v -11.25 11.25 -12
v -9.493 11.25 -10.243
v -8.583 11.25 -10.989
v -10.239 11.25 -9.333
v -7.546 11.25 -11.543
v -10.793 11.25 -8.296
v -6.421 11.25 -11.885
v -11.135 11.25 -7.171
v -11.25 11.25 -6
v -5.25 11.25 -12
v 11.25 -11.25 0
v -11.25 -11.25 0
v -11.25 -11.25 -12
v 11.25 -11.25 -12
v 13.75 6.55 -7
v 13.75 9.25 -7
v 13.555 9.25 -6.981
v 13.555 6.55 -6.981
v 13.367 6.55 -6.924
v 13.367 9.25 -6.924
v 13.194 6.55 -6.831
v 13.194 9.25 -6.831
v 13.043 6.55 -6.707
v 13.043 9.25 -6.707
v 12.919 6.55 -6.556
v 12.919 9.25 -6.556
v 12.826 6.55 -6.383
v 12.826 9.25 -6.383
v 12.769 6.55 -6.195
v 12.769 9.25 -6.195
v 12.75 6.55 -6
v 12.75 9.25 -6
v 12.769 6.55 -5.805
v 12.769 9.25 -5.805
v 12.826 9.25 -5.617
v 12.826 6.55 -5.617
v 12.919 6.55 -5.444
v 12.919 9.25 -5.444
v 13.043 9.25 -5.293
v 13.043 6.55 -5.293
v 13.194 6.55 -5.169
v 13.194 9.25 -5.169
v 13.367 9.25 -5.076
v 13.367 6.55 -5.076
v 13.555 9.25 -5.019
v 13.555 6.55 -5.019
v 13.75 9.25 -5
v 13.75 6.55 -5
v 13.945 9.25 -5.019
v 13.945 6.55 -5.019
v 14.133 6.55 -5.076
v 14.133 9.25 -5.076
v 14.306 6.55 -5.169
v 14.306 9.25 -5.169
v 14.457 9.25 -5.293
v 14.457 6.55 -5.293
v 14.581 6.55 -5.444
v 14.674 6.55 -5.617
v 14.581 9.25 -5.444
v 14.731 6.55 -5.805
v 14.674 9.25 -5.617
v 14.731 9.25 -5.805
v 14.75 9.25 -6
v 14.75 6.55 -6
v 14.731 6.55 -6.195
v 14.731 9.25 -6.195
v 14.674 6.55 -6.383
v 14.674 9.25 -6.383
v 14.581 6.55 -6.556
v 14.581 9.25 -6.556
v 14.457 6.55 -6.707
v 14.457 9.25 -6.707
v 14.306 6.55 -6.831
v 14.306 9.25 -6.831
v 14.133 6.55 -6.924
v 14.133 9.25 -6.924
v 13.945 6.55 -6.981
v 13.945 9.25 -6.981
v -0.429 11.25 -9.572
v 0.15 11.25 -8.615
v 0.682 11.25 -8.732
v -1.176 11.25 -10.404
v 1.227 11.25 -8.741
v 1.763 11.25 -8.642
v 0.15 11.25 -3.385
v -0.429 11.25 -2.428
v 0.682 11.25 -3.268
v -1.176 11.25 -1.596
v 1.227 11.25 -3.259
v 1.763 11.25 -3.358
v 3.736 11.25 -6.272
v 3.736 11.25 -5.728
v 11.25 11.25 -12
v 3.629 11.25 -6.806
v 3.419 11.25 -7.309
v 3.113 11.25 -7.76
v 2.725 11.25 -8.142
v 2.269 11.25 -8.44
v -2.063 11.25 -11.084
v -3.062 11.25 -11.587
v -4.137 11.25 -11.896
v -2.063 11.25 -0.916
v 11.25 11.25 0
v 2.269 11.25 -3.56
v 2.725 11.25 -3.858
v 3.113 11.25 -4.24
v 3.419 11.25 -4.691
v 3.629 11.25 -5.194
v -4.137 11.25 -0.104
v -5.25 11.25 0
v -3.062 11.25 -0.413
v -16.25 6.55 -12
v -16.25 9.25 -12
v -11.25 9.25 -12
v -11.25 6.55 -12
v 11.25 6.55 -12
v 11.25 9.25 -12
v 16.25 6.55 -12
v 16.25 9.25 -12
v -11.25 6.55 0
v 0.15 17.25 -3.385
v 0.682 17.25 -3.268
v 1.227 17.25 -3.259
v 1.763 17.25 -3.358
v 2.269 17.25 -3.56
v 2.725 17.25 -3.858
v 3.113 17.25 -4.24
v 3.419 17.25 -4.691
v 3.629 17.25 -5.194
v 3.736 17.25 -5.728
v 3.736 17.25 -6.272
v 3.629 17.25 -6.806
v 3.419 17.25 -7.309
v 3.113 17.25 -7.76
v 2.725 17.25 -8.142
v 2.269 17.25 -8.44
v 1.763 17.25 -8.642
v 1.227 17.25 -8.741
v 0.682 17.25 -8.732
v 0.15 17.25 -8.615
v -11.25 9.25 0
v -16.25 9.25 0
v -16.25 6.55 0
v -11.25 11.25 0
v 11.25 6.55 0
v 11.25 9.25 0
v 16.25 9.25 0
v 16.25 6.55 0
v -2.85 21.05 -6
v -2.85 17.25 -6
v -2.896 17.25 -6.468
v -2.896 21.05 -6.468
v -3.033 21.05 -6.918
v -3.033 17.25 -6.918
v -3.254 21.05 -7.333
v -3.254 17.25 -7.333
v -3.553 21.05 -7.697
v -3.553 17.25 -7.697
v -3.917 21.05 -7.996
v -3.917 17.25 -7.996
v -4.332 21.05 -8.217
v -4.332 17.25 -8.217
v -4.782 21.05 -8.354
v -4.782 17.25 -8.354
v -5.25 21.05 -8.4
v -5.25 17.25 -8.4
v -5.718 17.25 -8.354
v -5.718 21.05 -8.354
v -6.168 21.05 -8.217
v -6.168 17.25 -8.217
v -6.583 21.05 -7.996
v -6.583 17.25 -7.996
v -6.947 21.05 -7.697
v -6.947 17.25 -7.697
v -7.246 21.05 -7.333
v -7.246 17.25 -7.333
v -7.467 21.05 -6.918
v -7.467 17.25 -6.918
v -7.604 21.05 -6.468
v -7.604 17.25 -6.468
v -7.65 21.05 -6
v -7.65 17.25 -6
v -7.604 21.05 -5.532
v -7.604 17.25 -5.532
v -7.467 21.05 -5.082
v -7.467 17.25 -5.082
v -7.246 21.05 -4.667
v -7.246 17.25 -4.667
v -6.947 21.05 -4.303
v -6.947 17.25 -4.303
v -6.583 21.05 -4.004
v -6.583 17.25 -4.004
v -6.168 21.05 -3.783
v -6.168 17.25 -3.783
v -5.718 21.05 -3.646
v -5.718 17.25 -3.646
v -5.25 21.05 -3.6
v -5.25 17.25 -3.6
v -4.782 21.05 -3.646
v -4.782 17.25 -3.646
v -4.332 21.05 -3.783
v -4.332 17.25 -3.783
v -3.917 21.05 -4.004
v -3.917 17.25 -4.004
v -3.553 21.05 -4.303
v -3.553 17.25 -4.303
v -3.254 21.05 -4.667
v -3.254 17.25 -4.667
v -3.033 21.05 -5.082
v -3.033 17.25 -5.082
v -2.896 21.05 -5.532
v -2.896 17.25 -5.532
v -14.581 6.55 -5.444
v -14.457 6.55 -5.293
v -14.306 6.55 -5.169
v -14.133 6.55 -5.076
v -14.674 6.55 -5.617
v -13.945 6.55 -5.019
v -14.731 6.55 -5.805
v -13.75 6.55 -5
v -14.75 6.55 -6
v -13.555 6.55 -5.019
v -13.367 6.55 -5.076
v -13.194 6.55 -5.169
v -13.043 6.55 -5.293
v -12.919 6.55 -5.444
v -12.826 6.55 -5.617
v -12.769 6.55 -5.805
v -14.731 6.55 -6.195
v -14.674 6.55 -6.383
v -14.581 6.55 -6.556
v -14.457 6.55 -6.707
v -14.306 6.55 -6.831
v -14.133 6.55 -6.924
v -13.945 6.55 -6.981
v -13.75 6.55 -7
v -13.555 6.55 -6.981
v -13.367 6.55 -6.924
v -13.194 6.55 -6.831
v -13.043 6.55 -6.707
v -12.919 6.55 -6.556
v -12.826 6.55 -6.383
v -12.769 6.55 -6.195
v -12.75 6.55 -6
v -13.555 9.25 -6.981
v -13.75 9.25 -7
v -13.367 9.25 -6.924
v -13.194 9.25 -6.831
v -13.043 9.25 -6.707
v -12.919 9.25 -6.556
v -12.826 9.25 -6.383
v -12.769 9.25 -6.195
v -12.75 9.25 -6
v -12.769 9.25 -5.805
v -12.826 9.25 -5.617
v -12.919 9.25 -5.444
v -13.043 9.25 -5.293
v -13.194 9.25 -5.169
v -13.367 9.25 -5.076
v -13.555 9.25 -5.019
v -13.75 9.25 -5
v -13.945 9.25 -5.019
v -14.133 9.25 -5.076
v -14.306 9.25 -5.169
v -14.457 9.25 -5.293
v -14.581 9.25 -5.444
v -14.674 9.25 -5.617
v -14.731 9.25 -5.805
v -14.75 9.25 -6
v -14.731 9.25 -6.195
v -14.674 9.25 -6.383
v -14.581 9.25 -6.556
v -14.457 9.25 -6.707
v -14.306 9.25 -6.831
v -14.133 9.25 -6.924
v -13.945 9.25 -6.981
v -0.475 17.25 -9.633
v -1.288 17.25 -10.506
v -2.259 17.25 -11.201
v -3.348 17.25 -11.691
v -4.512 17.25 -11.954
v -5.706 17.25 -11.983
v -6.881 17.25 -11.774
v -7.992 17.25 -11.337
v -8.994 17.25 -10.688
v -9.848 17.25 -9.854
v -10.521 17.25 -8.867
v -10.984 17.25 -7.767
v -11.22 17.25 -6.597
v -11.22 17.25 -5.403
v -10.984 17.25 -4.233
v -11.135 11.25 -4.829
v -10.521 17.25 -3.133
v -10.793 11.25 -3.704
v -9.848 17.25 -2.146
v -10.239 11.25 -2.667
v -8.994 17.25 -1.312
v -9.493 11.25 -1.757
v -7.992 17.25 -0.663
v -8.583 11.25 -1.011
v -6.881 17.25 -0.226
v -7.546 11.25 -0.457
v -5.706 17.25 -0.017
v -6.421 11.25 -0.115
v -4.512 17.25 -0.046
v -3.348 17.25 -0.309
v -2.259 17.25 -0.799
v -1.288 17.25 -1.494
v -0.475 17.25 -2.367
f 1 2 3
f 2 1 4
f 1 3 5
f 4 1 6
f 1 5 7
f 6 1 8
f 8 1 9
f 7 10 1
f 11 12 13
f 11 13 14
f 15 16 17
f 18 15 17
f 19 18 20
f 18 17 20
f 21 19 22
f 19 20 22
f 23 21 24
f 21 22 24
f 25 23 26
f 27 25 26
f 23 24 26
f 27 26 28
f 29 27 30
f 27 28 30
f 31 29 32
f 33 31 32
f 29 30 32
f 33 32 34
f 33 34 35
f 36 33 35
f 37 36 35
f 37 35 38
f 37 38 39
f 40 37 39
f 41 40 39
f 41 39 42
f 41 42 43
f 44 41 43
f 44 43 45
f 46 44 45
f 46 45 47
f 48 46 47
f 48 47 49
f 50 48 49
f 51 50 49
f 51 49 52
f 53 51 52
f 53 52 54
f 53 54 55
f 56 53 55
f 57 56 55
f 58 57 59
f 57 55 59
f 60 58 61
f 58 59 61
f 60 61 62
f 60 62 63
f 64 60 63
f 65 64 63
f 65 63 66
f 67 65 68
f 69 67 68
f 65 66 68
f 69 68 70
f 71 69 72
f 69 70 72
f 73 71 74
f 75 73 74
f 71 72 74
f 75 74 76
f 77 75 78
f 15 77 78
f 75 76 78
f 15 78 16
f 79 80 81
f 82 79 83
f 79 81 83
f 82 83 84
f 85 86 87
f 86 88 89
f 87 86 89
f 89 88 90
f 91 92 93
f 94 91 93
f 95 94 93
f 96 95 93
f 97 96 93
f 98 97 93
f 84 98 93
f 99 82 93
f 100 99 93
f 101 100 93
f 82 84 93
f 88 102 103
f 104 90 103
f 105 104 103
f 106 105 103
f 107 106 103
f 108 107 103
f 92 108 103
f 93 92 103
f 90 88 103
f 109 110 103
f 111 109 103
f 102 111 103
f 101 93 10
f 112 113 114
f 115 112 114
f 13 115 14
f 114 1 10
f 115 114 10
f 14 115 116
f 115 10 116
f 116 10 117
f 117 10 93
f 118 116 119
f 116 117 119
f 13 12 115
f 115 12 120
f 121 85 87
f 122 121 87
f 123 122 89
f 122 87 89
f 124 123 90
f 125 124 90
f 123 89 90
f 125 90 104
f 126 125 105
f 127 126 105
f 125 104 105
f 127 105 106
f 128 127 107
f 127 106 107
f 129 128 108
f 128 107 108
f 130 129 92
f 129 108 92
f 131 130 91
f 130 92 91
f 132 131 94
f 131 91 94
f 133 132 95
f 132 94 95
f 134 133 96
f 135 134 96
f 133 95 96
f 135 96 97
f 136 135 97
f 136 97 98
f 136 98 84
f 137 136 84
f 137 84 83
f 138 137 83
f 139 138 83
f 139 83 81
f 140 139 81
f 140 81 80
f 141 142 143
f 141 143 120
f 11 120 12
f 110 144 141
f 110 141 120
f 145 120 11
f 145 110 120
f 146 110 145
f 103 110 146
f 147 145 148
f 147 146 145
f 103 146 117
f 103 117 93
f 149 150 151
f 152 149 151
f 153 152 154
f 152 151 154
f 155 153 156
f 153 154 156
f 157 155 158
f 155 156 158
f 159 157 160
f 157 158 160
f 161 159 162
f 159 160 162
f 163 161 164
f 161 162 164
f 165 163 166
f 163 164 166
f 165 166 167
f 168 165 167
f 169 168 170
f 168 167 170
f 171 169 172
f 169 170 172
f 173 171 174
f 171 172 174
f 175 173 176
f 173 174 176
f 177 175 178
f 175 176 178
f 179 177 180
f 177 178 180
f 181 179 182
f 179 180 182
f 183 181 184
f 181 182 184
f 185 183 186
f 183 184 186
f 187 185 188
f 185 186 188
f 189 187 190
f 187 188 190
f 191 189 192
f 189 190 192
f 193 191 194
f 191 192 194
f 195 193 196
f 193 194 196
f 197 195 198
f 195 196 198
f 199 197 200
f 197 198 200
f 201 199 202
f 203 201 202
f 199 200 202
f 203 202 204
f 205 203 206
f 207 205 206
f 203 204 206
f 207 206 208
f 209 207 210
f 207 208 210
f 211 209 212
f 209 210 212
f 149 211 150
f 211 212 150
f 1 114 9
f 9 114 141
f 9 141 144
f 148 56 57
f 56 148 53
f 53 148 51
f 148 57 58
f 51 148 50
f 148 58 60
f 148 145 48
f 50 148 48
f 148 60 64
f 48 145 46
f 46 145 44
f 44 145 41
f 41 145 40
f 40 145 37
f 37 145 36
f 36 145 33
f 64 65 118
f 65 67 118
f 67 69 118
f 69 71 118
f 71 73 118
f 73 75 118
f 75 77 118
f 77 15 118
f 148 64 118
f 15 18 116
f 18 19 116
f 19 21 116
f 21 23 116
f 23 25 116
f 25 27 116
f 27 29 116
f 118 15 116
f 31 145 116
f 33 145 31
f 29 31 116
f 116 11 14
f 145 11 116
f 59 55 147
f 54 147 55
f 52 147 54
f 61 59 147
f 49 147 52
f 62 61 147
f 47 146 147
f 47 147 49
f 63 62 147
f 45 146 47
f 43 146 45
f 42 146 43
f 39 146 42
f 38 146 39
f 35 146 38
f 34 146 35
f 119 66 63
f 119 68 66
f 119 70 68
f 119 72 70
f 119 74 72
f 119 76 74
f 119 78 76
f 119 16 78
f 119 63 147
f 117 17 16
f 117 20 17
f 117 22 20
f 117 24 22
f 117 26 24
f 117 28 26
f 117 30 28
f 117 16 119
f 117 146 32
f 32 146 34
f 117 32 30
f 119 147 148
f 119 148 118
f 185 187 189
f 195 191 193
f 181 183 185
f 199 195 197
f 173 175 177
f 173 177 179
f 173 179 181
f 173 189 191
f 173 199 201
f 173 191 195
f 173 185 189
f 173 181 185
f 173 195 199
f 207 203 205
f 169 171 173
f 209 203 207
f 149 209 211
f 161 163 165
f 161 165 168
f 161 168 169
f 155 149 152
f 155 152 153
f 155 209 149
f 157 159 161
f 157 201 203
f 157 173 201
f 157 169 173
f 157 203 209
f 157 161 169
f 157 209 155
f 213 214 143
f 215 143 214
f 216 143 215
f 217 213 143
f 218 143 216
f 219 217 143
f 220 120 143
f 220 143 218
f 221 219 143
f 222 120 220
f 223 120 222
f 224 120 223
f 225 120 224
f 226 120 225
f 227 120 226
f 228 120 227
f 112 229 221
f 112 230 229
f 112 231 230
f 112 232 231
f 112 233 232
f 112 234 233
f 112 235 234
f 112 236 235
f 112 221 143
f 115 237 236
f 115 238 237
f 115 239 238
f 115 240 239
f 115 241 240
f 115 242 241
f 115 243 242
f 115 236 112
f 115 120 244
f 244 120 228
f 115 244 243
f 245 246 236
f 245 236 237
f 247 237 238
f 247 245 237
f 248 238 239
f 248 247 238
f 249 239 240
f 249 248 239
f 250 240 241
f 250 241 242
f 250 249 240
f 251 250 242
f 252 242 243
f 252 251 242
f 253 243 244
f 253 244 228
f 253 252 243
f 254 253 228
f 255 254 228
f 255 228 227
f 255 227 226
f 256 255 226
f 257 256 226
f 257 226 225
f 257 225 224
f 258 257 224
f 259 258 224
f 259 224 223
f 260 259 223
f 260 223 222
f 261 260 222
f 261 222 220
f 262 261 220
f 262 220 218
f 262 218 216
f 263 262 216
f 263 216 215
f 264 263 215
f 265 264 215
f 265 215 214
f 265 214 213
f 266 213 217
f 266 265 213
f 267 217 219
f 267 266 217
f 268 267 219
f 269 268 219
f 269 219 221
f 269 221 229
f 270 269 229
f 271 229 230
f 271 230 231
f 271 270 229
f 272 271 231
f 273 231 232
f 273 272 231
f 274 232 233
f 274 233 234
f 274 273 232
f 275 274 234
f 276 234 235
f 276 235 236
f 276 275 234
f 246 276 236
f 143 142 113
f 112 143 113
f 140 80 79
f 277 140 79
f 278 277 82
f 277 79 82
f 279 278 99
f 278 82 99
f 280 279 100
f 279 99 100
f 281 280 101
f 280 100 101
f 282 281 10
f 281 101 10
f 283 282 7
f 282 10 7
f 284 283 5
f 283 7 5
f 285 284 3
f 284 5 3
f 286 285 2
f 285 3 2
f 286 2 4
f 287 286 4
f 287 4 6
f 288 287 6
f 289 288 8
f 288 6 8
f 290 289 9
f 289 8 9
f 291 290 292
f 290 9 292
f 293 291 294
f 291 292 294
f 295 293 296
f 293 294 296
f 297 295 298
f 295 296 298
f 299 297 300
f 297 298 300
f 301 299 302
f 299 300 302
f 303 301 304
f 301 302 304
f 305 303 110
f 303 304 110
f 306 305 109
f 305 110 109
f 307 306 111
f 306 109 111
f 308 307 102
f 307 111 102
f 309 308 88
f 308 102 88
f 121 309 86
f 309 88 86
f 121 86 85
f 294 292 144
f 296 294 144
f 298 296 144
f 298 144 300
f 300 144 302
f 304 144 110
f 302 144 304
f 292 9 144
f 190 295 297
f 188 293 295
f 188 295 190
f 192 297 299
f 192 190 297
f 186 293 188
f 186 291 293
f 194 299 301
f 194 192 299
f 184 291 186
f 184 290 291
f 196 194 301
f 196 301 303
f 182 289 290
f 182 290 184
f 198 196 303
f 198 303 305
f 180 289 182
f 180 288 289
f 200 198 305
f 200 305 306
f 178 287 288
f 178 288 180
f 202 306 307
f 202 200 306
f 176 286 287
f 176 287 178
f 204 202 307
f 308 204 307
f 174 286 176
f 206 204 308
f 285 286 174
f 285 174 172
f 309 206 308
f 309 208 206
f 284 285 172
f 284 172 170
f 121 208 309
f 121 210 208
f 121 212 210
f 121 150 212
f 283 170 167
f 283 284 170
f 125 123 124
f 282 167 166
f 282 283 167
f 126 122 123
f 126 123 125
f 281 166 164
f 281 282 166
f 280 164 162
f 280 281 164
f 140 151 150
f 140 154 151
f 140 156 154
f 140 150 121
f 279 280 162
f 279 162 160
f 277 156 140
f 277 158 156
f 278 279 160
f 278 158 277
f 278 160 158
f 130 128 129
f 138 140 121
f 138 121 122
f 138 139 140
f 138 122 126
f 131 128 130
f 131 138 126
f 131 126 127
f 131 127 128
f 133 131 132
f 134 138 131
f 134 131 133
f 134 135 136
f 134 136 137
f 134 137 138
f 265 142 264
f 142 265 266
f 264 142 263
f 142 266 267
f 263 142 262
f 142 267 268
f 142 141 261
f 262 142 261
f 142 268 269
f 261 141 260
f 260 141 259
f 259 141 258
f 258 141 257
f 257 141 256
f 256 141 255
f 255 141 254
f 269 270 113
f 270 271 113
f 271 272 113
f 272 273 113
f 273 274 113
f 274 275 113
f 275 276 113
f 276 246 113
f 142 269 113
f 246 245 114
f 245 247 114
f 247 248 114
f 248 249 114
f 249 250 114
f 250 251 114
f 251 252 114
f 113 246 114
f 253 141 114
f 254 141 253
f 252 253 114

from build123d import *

# Parameters (mm, degrees)
SKETCH_1_W                      = 22.5
SKETCH_1_H                      = 22.5
EXTRUDE_1_DEPTH                 = 12
SKETCH_2_W                      = 12
SKETCH_2_H                      = 2.7
EXTRUDE_2_DEPTH                 = 5
CUT_EXTRUDE_1_REACH             = 30.78
SKETCH_4_R                      = 1
CUT_EXTRUDE_1_DIRECTION_2_DEPTH = 29.78041869
EXTRUDE_3_DEPTH                 = 6
SKETCH_6_R                      = 2.4
EXTRUDE_4_DEPTH                 = 3.8


with BuildPart() as part:
    # 草图1 → 凸台-拉伸1 (new body)
    with BuildSketch(Plane.XY):
        Rectangle(SKETCH_1_W, SKETCH_1_H)
    extrude(amount=-EXTRUDE_1_DEPTH)

    # 草图2 → 凸台-拉伸2 (add)
    with BuildSketch(Plane(origin=(11.25, 0, 0), x_dir=(0, 0, -1), z_dir=(1, 0, 0))):
        with Locations((6, 7.9)):
            Rectangle(SKETCH_2_W, SKETCH_2_H)
    extrude(amount=EXTRUDE_2_DEPTH)

    # 草图4 → 切除-拉伸1 (cut, up to next)
    with BuildSketch(Plane(origin=(0, 9.25, 0), x_dir=(1, 0, 0), z_dir=(0, 1, 0)), mode=Mode.PRIVATE) as cut_extrude_1_sk1:
        with Locations(Location((13.75, 6, 0), (0, 0, 90))):
            Circle(SKETCH_4_R)
    cut_extrude_1_tool1 = extrude(cut_extrude_1_sk1.sketch, amount=-CUT_EXTRUDE_1_REACH, mode=Mode.PRIVATE) & part.part
    add(cut_extrude_1_tool1.solids().sort_by_distance((13.75, 9.25, -6))[0], mode=Mode.SUBTRACT)

    # 草图4 → 切除-拉伸1 direction 2 (cut)
    with BuildSketch(Plane(origin=(0, 9.25, 0), x_dir=(1, 0, 0), z_dir=(0, 1, 0))):
        with Locations(Location((13.75, 6, 0), (0, 0, 90))):
            Circle(SKETCH_4_R)
    extrude(amount=CUT_EXTRUDE_1_DIRECTION_2_DEPTH, mode=Mode.SUBTRACT)

    # 镜向1: part across plane


with BuildPart() as part_1:
    add(part.part)
    add(part.part.mirror(Plane(origin=(0, 0, 0), x_dir=(0, 0, 1), z_dir=(1, 0, 0))))

    # 草图5 → 凸台-拉伸3 (add)
    with BuildSketch(Plane(origin=(0, 11.25, 0), x_dir=(1, 0, 0), z_dir=(0, 1, 0))):
        with BuildLine():
            ThreePointArc((0.15, 8.615339366), (-11.25, 6), (0.15, 3.384660634))
            ThreePointArc((0.15, 3.384660634), (3.75, 6), (0.15, 8.615339366))
        make_face()
    extrude(amount=EXTRUDE_3_DEPTH)

    # 草图6 → 凸台-拉伸4 (add)
    with BuildSketch(Plane(origin=(0, 17.25, 0), x_dir=(1, 0, 0), z_dir=(0, 1, 0))):
        with Locations((-5.25, 6)):
            Circle(SKETCH_6_R)
    extrude(amount=EXTRUDE_4_DEPTH)


solid = part_1.part
